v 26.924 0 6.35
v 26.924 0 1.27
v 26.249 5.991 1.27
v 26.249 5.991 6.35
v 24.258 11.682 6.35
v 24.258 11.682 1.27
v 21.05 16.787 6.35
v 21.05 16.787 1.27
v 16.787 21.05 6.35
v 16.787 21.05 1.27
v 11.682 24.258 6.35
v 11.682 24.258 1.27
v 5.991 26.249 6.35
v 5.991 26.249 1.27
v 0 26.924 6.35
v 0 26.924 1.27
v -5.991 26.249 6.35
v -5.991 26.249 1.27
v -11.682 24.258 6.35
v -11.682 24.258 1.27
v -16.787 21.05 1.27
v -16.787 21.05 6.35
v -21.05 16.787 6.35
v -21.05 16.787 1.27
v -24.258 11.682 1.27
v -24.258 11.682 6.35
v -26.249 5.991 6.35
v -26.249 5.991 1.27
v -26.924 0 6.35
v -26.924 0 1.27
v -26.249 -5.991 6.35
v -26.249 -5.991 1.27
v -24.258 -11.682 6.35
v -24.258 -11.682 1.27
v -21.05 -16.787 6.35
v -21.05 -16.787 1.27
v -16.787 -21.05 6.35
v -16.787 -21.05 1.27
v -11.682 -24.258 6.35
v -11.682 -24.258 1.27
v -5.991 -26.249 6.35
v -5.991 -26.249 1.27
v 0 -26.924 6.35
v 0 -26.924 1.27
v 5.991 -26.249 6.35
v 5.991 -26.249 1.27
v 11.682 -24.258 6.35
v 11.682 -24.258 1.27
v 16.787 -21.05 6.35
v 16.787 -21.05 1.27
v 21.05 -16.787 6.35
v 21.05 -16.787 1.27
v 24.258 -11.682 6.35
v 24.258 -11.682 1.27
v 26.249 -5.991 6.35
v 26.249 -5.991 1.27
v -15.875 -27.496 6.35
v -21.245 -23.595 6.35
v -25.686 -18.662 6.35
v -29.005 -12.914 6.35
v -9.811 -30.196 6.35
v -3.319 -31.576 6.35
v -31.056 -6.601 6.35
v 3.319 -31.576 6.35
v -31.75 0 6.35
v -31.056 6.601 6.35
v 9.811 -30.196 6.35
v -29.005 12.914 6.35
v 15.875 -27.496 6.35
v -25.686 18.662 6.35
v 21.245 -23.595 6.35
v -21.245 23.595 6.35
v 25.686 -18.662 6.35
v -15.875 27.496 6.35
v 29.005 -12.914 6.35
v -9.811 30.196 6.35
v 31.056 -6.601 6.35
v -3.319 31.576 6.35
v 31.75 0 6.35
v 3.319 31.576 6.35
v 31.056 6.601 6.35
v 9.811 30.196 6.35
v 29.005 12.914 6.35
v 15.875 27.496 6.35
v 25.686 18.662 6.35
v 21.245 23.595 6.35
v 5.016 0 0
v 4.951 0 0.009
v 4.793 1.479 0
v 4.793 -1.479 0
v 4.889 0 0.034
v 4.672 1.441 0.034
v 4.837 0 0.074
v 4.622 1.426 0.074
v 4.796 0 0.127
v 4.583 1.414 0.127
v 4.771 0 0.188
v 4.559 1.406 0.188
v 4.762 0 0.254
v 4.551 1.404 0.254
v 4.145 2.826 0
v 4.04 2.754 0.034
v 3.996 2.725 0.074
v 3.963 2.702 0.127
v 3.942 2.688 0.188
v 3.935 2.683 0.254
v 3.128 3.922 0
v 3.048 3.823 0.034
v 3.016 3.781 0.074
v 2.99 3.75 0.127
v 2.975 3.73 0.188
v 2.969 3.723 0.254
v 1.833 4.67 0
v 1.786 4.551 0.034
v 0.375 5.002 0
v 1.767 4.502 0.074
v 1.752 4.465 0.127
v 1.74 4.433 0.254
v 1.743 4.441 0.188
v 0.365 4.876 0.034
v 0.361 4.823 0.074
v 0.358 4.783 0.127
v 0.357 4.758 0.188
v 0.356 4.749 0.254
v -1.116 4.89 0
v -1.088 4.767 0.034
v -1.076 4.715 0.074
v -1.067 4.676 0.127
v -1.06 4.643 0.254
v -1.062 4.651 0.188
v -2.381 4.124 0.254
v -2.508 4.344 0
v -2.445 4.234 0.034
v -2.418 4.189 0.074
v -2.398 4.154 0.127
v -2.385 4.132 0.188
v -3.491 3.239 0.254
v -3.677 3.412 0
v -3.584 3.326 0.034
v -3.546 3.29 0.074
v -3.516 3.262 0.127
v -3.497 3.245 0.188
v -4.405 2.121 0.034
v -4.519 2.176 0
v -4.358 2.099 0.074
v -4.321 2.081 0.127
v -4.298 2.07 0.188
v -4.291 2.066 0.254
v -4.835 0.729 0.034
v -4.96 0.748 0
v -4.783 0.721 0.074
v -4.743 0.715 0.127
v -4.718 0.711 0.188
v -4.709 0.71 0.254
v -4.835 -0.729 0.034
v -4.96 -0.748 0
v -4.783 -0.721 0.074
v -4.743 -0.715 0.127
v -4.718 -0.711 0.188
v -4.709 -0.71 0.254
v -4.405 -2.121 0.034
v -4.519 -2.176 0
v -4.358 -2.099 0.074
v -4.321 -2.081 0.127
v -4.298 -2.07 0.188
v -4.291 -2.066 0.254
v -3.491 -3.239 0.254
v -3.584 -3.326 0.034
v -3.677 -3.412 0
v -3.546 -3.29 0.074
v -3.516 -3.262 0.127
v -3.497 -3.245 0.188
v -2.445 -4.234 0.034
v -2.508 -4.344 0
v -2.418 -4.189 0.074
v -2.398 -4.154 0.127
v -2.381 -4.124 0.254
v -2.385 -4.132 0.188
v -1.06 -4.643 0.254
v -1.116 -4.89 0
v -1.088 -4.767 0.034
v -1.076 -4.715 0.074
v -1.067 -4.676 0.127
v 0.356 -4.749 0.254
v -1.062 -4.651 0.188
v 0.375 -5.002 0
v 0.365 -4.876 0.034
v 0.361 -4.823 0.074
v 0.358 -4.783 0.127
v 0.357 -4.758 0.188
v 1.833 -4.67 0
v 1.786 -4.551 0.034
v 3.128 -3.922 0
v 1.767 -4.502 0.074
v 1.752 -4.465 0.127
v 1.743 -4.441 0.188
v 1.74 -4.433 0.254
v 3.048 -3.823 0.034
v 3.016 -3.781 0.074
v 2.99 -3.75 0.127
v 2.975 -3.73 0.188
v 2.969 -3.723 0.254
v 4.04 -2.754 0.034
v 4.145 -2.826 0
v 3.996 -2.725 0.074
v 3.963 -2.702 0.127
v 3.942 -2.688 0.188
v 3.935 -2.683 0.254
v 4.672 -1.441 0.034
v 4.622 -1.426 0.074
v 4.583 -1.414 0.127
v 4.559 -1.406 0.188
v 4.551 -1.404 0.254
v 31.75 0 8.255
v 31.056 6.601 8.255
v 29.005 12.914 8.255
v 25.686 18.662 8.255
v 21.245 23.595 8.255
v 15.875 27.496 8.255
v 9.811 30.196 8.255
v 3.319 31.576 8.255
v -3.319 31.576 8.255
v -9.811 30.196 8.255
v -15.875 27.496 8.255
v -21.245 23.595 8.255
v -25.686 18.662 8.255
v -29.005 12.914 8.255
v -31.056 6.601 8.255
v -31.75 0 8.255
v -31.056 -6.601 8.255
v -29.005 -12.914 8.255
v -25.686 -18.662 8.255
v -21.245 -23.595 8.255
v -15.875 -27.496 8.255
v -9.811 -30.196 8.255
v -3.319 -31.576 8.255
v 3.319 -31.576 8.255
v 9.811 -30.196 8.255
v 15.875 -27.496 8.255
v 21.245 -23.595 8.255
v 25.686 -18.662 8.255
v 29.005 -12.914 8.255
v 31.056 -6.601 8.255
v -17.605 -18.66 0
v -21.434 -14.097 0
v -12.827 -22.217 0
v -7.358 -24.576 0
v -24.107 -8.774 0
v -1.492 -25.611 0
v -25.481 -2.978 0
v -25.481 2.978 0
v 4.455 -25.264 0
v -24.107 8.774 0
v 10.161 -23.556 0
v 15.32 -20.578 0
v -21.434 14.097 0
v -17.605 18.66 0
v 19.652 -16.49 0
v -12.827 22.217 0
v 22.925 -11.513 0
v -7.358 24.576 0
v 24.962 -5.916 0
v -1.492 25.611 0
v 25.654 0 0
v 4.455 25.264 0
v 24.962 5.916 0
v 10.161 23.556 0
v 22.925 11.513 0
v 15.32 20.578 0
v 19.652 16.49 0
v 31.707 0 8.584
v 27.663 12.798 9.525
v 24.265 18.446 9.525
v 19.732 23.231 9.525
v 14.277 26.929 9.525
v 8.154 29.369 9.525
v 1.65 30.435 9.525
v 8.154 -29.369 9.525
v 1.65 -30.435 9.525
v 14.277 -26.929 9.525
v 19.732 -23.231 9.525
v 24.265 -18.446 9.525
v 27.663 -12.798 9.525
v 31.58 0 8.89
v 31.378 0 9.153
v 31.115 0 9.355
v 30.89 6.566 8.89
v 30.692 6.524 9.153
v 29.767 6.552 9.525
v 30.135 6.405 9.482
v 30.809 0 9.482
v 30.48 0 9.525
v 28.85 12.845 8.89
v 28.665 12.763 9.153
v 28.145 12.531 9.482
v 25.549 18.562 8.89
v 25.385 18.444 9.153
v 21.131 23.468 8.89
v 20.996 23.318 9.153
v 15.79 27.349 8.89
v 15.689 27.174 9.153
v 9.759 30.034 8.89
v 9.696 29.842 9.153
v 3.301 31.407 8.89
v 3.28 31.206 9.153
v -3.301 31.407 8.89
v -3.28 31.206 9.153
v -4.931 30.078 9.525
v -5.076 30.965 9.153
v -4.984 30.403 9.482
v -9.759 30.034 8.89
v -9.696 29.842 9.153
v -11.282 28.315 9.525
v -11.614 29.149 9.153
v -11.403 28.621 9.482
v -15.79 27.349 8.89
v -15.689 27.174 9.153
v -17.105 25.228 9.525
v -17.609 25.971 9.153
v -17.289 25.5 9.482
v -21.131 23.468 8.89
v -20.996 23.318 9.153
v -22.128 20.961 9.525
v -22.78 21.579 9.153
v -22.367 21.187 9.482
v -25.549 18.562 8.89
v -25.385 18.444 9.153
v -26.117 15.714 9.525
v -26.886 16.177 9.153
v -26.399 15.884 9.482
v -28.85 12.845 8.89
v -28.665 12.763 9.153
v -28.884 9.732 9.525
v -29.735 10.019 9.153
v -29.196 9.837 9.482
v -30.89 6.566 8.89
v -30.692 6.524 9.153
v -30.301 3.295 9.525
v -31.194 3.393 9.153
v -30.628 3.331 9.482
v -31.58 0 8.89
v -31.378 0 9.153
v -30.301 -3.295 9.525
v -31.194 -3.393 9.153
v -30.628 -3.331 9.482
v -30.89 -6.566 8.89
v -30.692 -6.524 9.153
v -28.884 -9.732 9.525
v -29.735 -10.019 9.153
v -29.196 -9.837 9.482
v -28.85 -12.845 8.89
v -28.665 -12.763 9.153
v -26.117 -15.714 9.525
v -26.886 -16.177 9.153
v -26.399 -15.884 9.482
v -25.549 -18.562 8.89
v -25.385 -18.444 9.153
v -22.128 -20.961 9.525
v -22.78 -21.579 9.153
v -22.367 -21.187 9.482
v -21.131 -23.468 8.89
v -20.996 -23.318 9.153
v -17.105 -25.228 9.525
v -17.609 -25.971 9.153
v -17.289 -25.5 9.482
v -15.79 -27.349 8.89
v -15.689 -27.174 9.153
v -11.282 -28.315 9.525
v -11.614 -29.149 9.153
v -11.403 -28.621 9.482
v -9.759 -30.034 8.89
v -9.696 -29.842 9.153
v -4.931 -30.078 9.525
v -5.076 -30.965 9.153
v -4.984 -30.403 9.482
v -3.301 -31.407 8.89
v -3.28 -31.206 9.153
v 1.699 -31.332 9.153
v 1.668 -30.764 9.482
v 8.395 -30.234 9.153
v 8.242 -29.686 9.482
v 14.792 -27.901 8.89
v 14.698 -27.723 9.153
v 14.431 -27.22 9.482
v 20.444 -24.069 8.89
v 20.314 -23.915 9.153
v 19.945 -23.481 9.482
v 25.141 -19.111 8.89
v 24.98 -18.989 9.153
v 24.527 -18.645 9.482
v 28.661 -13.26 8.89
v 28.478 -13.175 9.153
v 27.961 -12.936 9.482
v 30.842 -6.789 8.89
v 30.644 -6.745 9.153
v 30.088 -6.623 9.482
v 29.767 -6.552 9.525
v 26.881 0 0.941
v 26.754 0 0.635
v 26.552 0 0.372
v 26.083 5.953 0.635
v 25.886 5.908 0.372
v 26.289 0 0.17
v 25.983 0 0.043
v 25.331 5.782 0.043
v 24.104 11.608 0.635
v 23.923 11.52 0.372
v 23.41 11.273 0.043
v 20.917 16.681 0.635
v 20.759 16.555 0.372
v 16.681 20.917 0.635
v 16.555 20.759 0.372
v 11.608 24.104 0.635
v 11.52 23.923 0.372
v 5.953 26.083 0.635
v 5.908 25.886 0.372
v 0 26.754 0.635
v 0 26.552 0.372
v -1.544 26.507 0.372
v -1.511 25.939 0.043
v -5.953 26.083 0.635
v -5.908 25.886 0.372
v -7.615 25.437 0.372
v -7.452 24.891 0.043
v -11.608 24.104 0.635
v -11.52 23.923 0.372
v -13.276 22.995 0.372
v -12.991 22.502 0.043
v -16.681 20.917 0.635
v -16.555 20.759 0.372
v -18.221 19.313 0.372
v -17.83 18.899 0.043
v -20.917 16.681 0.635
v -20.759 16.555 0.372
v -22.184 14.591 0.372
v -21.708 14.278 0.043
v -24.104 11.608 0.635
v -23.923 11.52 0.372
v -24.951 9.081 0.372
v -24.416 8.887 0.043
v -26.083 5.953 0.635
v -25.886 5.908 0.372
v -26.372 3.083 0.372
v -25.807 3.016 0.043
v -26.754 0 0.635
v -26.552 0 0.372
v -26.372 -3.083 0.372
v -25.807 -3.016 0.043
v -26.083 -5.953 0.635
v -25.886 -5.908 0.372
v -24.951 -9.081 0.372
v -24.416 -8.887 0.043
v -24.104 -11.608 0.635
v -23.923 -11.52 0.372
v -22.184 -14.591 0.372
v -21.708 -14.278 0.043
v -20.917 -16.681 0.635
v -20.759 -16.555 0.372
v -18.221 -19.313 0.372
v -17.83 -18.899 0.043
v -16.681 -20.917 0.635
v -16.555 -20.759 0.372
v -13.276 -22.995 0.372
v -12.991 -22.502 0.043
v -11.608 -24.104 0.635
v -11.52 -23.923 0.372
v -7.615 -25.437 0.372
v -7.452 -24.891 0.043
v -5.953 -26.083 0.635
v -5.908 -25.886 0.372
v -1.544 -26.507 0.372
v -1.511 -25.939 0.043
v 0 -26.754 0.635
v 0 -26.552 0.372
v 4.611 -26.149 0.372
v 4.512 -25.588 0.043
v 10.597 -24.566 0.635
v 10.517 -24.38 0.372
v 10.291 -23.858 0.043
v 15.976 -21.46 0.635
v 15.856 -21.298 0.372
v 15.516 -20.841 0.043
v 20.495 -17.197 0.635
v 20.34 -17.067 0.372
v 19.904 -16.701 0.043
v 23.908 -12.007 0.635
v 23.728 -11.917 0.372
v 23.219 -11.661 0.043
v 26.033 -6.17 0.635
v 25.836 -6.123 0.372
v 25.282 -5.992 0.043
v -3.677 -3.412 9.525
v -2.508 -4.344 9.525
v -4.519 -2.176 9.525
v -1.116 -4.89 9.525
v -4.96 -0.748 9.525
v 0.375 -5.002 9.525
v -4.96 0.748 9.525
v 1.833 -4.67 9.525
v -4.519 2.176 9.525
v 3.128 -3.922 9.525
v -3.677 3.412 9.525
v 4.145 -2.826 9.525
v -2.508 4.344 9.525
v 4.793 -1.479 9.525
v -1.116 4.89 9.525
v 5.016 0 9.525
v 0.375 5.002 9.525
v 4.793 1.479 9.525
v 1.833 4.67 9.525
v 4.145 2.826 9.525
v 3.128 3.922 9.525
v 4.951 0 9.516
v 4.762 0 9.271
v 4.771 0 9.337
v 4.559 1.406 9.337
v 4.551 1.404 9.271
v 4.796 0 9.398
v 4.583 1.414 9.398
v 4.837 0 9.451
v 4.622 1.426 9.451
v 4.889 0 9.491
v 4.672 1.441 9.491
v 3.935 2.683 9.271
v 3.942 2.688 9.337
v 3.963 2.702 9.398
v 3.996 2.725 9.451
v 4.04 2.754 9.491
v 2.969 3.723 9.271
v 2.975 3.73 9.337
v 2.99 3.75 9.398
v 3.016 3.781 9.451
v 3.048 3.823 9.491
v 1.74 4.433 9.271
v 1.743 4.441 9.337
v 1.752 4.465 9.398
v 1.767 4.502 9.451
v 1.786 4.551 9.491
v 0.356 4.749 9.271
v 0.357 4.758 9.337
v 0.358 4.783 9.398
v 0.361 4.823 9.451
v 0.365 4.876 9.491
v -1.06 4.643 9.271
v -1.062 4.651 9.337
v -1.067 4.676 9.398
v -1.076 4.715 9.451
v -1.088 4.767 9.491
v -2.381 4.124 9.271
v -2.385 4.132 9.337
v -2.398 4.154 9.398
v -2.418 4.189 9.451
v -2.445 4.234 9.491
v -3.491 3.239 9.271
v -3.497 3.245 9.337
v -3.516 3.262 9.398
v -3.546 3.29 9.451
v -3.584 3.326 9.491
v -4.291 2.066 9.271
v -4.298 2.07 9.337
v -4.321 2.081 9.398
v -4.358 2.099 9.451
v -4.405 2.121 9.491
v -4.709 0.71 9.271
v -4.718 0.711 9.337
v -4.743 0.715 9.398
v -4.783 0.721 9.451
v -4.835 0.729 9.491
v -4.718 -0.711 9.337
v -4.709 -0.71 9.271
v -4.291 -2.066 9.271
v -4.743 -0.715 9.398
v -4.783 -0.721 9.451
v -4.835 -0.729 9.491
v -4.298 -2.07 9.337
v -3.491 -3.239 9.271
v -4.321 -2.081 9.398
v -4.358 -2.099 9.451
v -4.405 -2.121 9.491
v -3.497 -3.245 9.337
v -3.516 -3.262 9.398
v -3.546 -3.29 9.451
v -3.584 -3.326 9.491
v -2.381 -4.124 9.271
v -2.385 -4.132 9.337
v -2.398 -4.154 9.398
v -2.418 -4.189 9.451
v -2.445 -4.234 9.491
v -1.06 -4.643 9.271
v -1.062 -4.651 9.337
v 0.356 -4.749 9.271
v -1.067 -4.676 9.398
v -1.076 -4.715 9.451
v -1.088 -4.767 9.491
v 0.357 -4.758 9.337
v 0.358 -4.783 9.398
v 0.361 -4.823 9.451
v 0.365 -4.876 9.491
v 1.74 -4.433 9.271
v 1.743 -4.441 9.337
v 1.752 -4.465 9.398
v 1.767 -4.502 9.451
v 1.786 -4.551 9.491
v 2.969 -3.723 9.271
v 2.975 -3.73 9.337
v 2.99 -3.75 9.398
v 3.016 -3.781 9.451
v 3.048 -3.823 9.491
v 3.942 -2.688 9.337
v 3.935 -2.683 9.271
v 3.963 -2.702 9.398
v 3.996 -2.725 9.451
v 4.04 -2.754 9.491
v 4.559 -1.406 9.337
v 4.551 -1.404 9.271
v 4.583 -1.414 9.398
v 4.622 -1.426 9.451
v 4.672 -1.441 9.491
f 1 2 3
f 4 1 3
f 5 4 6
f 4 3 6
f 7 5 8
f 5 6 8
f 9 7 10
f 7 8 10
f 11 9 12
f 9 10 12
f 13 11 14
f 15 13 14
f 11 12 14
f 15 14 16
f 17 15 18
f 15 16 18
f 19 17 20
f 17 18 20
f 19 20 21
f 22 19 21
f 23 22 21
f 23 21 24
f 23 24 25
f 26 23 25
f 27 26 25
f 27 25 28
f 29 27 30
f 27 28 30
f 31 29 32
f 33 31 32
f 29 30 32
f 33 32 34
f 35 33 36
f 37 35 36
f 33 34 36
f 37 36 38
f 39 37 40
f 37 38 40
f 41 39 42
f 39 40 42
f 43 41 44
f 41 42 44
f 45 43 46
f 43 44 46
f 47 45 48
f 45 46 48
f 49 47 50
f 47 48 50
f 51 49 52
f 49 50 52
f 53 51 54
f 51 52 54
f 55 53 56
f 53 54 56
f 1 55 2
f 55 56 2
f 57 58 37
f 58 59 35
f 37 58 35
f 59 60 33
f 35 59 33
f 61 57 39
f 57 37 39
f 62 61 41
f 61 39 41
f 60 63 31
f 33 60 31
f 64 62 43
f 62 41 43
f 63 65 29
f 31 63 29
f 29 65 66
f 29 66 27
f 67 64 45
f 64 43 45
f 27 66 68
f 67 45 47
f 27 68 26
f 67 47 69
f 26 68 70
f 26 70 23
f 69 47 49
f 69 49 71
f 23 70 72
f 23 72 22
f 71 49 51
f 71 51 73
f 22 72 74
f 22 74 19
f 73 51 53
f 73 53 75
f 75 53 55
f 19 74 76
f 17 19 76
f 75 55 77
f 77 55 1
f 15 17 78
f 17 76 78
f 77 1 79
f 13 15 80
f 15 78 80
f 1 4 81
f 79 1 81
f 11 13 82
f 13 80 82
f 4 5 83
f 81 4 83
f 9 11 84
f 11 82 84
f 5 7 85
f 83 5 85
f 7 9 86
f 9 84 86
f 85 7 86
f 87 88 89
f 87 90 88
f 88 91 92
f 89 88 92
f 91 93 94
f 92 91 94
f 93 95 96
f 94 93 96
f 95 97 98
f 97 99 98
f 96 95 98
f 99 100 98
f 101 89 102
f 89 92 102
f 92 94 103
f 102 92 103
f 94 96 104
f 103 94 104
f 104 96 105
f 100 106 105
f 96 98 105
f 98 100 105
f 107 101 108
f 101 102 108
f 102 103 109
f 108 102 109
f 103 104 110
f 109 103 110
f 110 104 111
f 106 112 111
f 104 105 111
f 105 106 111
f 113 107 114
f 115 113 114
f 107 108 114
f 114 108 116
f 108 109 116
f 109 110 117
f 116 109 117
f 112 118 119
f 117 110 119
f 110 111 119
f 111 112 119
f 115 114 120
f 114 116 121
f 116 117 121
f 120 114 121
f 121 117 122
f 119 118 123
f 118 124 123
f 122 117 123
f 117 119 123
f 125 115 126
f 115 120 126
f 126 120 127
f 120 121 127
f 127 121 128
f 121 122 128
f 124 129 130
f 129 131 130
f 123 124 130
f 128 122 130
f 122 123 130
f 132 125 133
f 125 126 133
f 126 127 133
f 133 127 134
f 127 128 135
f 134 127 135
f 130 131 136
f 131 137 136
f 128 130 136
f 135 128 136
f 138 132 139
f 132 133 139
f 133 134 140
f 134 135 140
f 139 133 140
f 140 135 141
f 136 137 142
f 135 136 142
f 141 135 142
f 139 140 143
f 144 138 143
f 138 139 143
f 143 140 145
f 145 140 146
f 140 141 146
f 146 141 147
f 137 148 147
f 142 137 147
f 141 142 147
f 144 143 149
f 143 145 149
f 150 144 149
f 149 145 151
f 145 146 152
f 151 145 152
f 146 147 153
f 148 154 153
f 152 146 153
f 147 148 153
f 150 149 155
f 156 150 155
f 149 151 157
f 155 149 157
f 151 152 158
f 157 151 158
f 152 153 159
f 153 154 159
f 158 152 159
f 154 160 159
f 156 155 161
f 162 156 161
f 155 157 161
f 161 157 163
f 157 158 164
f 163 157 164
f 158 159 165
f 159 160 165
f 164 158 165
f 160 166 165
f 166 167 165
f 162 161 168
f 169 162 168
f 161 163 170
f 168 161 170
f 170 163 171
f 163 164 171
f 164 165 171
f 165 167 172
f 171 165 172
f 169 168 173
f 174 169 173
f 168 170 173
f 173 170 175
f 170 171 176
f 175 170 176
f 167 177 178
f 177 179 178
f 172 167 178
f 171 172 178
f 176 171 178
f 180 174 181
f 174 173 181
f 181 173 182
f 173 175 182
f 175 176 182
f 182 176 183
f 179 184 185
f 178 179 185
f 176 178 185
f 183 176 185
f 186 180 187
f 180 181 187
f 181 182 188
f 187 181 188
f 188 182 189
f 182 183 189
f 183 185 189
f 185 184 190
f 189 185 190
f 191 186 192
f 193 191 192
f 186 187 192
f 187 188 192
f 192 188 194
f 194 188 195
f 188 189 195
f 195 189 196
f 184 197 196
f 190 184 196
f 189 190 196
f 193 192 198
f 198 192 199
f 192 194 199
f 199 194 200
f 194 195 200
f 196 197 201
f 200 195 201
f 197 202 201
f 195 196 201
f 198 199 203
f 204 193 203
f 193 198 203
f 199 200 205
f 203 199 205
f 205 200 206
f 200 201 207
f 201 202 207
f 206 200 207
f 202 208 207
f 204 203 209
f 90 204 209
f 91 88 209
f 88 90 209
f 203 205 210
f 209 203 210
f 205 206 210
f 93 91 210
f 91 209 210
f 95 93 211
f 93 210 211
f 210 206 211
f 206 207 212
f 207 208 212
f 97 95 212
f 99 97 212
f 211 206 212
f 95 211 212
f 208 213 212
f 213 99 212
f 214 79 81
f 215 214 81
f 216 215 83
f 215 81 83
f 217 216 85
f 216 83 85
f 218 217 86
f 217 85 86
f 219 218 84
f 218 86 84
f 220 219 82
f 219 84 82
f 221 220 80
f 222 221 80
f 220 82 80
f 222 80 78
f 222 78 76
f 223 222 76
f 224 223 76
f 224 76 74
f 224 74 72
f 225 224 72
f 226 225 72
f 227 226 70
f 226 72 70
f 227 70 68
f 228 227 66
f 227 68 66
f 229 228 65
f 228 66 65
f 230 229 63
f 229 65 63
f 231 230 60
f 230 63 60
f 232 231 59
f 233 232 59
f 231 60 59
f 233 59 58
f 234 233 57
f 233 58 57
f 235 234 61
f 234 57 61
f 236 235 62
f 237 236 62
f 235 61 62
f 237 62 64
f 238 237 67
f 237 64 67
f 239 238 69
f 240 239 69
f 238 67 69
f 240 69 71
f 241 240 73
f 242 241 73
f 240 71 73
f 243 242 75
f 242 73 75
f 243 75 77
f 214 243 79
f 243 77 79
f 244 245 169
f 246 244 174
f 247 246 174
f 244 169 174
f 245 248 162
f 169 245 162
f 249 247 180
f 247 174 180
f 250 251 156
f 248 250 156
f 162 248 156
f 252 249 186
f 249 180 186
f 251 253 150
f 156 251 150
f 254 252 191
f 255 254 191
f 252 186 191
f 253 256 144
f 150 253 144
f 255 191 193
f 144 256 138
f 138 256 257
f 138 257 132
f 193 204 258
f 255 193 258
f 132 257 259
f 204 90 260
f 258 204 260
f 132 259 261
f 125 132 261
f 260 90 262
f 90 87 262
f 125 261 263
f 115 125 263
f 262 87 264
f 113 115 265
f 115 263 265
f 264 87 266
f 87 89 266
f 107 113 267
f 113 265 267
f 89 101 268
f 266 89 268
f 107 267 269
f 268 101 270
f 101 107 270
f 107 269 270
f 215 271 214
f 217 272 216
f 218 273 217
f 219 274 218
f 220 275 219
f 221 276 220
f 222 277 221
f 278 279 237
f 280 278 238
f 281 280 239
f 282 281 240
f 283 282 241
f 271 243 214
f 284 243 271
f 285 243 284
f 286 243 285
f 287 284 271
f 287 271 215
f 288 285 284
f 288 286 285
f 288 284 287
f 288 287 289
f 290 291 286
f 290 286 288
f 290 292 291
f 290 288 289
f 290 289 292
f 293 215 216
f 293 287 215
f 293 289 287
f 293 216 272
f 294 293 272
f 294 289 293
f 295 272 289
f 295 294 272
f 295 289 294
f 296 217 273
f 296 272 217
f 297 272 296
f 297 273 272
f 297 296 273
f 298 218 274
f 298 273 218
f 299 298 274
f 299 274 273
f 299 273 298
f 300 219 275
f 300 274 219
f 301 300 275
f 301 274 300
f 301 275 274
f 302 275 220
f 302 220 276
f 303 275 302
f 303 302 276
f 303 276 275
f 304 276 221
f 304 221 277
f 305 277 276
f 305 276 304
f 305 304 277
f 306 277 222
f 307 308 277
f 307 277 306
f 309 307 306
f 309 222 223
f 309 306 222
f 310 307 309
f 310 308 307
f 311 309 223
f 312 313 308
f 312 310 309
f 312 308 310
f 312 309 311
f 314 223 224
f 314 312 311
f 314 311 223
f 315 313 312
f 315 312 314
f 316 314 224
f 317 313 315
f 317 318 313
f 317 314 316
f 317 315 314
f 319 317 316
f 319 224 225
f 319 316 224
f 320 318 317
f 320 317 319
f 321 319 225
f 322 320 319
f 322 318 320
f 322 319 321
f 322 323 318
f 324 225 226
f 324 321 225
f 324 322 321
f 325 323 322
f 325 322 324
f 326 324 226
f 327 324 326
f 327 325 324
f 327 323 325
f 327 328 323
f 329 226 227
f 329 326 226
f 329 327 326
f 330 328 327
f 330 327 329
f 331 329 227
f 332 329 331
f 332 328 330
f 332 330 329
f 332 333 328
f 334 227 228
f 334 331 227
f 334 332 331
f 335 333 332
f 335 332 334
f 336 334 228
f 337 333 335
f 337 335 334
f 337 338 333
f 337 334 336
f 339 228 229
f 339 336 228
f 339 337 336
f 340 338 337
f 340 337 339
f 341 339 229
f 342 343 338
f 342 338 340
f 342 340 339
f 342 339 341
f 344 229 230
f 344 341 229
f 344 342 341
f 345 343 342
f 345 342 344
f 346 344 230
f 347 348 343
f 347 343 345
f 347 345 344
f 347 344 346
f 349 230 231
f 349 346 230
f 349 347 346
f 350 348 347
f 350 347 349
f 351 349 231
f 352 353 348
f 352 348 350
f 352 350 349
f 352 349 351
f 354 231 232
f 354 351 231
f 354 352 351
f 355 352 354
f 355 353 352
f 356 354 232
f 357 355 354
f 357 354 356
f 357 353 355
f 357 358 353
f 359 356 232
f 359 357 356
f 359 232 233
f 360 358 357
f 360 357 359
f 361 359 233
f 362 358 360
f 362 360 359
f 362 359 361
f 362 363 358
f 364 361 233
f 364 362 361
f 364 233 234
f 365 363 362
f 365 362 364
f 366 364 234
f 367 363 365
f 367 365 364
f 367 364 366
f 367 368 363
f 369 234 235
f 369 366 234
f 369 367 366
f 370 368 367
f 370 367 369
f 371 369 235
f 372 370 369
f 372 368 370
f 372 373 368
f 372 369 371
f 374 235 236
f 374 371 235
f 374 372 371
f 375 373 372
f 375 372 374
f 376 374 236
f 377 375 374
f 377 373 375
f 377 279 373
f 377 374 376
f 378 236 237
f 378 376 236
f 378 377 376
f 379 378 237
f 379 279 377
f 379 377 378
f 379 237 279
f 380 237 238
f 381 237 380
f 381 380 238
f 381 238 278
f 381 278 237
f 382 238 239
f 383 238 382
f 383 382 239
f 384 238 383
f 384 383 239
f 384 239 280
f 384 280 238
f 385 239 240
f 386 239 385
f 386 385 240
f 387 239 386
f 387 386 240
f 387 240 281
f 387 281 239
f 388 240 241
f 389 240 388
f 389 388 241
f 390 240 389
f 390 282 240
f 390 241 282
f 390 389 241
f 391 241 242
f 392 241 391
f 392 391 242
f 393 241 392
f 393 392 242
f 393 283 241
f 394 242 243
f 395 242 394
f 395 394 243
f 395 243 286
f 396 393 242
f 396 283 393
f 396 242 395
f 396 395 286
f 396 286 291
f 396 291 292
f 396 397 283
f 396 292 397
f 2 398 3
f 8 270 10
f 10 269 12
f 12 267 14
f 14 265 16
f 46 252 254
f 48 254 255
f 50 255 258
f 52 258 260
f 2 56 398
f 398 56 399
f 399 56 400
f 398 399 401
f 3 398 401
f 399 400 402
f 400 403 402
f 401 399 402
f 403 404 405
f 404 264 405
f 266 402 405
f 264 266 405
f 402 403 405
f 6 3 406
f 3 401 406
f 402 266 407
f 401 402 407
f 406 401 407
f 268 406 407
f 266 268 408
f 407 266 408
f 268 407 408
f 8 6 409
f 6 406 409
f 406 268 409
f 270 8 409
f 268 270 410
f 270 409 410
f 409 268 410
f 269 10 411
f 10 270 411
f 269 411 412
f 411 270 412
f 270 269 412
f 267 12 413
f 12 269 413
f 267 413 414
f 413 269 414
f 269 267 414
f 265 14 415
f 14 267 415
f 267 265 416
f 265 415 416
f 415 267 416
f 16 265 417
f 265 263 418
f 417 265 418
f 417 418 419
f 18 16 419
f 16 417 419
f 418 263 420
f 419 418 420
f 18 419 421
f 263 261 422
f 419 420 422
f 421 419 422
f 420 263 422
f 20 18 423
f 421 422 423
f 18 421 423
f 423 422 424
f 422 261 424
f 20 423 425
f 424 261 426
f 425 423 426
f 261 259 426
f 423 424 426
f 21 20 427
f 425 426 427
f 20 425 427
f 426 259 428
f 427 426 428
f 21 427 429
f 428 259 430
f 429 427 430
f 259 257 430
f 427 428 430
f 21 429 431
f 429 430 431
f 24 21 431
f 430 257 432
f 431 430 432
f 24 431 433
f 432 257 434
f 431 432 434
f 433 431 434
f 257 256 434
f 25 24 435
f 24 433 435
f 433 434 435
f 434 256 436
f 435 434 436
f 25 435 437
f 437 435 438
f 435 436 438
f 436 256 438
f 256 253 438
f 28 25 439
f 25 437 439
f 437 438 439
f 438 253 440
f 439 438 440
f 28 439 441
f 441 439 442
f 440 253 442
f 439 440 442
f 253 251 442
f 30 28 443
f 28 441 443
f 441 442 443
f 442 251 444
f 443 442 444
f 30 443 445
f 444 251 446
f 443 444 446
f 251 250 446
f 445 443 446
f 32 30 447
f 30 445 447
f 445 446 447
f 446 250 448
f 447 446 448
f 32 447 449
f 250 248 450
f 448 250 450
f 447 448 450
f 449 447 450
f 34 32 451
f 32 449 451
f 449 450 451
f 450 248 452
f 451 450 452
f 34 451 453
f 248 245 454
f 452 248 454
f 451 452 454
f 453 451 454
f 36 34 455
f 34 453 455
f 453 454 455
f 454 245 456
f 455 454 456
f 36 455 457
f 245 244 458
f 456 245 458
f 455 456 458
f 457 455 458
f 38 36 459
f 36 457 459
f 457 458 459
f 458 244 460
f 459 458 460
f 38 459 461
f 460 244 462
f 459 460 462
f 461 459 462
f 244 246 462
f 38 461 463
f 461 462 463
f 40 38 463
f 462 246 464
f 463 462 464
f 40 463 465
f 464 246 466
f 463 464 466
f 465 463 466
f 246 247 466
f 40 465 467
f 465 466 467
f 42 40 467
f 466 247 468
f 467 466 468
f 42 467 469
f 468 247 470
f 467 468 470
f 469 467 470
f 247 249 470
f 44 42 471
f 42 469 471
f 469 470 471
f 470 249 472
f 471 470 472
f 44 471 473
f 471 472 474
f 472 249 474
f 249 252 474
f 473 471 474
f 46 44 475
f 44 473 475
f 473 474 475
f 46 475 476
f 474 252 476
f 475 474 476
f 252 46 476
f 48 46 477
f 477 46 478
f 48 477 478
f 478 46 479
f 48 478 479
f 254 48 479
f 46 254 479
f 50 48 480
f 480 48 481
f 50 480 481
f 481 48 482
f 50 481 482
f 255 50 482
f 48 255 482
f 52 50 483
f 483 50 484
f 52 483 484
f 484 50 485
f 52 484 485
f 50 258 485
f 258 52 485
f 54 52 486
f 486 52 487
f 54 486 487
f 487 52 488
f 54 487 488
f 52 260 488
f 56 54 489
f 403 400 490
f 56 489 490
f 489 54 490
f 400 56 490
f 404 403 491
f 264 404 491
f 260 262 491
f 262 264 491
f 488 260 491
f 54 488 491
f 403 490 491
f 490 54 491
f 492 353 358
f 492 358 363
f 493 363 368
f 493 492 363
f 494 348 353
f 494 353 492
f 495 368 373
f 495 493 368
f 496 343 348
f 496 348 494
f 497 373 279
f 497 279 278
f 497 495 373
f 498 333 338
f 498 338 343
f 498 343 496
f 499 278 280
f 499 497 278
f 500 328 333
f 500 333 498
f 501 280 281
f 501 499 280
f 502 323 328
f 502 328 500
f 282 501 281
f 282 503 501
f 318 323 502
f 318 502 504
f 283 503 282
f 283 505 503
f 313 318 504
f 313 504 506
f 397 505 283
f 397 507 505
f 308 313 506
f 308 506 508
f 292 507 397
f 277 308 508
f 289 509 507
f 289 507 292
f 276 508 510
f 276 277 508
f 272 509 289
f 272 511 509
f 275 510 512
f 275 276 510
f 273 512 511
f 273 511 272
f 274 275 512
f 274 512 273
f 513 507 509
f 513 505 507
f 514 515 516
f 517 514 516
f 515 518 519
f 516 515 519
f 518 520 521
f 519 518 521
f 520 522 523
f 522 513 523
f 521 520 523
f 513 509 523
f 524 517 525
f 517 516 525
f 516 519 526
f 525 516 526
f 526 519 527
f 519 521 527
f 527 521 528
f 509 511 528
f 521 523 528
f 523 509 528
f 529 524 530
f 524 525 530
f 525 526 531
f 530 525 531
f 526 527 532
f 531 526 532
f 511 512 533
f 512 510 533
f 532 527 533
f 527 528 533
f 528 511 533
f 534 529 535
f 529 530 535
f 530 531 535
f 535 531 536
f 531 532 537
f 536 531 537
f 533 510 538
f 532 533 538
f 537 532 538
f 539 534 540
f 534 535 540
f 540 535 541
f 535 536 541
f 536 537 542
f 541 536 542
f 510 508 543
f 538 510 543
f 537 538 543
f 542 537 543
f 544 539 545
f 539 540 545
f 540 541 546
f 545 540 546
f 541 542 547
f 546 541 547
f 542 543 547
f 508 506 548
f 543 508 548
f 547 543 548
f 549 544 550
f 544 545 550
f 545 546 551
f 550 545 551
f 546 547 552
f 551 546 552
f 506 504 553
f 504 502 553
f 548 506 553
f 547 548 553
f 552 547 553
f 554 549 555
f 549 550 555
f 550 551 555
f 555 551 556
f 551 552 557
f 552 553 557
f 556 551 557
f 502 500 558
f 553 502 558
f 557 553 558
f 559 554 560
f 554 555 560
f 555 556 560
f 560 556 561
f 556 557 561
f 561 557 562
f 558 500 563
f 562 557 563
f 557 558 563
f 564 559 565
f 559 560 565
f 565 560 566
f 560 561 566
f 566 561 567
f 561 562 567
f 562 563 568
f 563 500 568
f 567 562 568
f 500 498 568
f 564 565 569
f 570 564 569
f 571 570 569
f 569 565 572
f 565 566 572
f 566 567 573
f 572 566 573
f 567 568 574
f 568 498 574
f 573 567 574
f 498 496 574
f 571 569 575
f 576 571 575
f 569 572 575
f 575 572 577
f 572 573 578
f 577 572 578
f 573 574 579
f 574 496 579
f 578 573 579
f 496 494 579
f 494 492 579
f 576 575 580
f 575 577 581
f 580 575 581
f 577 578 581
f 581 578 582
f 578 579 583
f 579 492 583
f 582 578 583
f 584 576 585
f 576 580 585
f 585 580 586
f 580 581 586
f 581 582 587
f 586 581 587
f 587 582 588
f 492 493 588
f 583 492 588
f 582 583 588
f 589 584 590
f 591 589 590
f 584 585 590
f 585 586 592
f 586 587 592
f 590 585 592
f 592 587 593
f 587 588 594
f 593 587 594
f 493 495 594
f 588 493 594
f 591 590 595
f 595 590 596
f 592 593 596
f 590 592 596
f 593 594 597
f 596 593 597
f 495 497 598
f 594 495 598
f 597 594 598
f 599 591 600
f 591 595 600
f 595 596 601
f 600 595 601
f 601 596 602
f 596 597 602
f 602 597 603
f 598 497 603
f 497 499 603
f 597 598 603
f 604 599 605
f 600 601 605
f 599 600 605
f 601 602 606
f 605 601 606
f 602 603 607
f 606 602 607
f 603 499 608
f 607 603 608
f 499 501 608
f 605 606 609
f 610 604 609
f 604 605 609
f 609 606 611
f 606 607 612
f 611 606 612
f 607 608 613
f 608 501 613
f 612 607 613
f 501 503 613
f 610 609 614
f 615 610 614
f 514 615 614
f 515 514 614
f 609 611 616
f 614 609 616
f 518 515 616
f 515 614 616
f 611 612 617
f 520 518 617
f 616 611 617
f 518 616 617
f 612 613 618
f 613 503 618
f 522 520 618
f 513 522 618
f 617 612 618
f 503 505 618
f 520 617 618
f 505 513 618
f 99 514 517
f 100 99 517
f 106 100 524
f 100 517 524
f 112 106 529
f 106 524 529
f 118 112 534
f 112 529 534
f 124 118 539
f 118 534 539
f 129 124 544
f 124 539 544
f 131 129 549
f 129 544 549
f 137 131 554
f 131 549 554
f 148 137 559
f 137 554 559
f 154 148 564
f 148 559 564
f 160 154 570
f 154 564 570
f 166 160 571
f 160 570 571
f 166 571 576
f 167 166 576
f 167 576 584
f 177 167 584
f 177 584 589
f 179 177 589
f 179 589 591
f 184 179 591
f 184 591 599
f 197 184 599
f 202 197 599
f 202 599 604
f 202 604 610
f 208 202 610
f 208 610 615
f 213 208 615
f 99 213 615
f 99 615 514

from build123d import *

# Parameters (mm, degrees)
F0_R     = 26.924
F1_DEPTH = 6.35
F2_R     = 31.75
F2_R_2   = 26.924
F3_DEPTH = 3.175
F4_R     = 4.762257
F5_DEPTH = 25.4
F6_R     = 1.27
F7_R     = 1.27
F8_R     = 0.254


with BuildPart() as f1:
    # F0 (on Top) → F1 (new body)
    with BuildSketch(Plane.XY):
        Circle(F0_R)
    extrude(amount=F1_DEPTH)

    # F2 (on face) → F3 (join)
    with BuildSketch(Plane.XY.offset(6.35)):
        Circle(F2_R)
        Circle(F2_R_2, mode=Mode.SUBTRACT)
        Circle(F2_R_2)
    extrude(amount=F3_DEPTH)

    # F4 (on face) → F5 (cut)
    with BuildSketch(Plane.XY.offset(9.525)):
        Circle(F4_R)
    extrude(amount=-F5_DEPTH, mode=Mode.SUBTRACT)

    # F6
    f6_edges = [f1.edges().sort_by_distance(p)[0] for p in [
        (-31.75, 0, 9.525),
    ]]
    fillet(f6_edges, radius=F6_R)

    # F7
    f7_edges = [f1.edges().sort_by_distance(p)[0] for p in [
        (-26.924, 0, 0),
    ]]
    fillet(f7_edges, radius=F7_R)

    # F8
    f8_edges = [f1.edges().sort_by_distance(p)[0] for p in [
        (-4.762257, 0, 9.525),
        (-25.654, 0, 0),
        (-4.762257, 0, 0),
    ]]
    fillet(f8_edges, radius=F8_R)


solid = f1.part
